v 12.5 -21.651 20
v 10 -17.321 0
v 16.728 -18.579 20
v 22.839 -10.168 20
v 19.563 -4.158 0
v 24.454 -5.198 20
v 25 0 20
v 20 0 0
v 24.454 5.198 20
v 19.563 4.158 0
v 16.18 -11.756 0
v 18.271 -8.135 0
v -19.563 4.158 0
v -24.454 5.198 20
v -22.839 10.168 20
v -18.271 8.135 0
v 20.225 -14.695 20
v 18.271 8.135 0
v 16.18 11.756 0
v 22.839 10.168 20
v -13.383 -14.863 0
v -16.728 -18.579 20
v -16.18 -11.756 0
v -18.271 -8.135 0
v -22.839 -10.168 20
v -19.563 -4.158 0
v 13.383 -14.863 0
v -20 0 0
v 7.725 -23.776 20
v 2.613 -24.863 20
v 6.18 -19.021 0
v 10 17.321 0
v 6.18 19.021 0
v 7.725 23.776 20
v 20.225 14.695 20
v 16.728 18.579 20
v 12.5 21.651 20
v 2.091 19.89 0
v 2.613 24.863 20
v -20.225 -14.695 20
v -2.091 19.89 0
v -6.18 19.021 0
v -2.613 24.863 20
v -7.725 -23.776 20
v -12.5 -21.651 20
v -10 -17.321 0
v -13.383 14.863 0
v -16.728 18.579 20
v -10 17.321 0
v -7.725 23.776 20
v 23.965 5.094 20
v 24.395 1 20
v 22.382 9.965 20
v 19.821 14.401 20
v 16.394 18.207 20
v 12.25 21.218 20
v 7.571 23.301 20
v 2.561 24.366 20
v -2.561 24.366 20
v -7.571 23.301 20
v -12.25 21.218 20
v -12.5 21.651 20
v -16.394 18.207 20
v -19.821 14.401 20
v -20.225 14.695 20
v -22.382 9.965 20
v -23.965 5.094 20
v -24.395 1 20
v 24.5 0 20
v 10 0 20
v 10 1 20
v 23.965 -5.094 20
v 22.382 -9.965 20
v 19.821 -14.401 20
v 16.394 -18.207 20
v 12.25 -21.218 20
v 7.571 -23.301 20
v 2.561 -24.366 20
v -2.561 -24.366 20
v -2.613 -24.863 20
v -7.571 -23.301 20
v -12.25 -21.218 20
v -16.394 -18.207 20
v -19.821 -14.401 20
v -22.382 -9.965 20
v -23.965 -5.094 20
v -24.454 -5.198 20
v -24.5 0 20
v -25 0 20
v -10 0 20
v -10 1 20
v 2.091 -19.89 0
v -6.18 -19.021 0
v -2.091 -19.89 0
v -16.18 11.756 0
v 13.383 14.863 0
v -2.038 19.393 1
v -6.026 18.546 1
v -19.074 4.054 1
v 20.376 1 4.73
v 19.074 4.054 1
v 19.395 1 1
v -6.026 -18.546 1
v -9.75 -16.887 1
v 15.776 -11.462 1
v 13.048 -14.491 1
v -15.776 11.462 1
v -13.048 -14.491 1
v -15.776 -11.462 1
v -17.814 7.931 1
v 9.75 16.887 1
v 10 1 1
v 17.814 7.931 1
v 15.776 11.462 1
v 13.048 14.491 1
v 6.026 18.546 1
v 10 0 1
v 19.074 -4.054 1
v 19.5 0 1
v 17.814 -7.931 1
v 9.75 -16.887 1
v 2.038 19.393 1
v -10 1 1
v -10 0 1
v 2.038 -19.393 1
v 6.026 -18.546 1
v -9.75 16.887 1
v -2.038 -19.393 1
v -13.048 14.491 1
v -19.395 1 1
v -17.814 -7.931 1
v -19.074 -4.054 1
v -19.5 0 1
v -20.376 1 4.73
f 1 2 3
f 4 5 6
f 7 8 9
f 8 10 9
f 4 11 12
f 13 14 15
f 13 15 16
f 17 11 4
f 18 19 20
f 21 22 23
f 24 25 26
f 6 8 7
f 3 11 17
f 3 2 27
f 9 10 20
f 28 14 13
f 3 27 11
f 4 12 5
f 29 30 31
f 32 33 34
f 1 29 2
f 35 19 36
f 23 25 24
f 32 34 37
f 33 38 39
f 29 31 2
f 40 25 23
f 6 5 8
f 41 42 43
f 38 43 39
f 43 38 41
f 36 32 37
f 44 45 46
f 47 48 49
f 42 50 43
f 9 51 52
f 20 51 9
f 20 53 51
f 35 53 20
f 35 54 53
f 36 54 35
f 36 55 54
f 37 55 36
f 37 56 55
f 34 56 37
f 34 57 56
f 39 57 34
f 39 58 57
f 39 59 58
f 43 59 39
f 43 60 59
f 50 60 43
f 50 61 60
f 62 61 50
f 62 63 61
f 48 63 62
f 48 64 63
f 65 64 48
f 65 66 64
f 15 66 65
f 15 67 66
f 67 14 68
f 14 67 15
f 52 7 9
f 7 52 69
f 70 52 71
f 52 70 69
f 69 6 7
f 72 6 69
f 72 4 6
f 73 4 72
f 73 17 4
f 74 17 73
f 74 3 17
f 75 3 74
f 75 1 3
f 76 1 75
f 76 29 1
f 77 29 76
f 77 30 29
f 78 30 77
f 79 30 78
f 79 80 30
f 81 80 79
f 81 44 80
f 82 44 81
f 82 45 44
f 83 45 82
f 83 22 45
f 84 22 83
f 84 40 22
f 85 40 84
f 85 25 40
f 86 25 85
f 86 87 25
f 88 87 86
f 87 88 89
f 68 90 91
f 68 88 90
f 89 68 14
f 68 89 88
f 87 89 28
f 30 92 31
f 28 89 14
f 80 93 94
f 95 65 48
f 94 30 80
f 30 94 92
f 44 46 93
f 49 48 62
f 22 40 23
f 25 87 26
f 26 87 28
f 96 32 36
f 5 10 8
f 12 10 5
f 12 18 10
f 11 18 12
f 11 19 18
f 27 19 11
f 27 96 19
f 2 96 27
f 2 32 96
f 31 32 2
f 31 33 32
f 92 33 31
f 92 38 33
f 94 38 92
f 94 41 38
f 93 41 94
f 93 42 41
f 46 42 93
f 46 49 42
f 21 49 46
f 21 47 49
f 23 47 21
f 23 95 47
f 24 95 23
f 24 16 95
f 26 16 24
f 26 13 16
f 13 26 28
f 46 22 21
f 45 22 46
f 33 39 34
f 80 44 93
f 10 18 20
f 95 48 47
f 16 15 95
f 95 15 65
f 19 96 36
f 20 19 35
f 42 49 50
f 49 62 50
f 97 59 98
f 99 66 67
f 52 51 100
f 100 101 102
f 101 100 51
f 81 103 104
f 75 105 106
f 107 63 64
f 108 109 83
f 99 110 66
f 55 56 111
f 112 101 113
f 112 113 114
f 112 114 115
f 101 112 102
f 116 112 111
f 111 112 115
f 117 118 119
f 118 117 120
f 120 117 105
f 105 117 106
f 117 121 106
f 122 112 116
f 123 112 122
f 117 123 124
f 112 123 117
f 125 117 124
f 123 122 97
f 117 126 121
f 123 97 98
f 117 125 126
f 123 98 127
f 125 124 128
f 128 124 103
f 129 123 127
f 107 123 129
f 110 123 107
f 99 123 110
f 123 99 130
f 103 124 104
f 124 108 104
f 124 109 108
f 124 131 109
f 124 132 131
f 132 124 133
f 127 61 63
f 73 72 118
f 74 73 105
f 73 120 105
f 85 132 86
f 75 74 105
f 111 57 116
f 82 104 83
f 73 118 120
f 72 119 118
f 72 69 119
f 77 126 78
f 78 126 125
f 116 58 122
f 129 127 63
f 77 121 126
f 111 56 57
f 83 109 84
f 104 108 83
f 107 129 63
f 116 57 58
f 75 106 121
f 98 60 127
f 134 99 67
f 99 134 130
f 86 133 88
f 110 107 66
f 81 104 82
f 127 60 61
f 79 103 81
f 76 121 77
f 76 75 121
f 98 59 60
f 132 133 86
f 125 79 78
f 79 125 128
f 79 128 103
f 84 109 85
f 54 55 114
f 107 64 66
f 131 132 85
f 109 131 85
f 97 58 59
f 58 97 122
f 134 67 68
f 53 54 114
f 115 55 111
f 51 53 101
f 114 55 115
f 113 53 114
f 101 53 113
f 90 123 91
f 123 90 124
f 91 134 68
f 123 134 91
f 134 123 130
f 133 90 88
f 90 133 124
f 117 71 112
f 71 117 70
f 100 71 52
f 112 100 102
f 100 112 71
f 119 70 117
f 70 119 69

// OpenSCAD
d1 = 40;
d2 = 50;
wall = 1;
h  = 20;
bottom = 1;

difference() {
cylinder(d1=d1, d2=d2, h=h);
translate([0, 0, bottom])
cylinder(d1=d1-wall, d2=d2-wall, h=h-bottom);
}

grab_handles = 0.3;
intersection() {
cylinder(d1=d1, d2=d2, h=h);    
translate([-0.5*d2, 0, 0]) cube([d2*grab_handles, wall, h]);
}

intersection() {
cylinder(d1=d1, d2=d2, h=h);    
translate([0.5*d2-(d2*grab_handles), 0, 0]) cube([d2*grab_handles, wall, h]);
}
